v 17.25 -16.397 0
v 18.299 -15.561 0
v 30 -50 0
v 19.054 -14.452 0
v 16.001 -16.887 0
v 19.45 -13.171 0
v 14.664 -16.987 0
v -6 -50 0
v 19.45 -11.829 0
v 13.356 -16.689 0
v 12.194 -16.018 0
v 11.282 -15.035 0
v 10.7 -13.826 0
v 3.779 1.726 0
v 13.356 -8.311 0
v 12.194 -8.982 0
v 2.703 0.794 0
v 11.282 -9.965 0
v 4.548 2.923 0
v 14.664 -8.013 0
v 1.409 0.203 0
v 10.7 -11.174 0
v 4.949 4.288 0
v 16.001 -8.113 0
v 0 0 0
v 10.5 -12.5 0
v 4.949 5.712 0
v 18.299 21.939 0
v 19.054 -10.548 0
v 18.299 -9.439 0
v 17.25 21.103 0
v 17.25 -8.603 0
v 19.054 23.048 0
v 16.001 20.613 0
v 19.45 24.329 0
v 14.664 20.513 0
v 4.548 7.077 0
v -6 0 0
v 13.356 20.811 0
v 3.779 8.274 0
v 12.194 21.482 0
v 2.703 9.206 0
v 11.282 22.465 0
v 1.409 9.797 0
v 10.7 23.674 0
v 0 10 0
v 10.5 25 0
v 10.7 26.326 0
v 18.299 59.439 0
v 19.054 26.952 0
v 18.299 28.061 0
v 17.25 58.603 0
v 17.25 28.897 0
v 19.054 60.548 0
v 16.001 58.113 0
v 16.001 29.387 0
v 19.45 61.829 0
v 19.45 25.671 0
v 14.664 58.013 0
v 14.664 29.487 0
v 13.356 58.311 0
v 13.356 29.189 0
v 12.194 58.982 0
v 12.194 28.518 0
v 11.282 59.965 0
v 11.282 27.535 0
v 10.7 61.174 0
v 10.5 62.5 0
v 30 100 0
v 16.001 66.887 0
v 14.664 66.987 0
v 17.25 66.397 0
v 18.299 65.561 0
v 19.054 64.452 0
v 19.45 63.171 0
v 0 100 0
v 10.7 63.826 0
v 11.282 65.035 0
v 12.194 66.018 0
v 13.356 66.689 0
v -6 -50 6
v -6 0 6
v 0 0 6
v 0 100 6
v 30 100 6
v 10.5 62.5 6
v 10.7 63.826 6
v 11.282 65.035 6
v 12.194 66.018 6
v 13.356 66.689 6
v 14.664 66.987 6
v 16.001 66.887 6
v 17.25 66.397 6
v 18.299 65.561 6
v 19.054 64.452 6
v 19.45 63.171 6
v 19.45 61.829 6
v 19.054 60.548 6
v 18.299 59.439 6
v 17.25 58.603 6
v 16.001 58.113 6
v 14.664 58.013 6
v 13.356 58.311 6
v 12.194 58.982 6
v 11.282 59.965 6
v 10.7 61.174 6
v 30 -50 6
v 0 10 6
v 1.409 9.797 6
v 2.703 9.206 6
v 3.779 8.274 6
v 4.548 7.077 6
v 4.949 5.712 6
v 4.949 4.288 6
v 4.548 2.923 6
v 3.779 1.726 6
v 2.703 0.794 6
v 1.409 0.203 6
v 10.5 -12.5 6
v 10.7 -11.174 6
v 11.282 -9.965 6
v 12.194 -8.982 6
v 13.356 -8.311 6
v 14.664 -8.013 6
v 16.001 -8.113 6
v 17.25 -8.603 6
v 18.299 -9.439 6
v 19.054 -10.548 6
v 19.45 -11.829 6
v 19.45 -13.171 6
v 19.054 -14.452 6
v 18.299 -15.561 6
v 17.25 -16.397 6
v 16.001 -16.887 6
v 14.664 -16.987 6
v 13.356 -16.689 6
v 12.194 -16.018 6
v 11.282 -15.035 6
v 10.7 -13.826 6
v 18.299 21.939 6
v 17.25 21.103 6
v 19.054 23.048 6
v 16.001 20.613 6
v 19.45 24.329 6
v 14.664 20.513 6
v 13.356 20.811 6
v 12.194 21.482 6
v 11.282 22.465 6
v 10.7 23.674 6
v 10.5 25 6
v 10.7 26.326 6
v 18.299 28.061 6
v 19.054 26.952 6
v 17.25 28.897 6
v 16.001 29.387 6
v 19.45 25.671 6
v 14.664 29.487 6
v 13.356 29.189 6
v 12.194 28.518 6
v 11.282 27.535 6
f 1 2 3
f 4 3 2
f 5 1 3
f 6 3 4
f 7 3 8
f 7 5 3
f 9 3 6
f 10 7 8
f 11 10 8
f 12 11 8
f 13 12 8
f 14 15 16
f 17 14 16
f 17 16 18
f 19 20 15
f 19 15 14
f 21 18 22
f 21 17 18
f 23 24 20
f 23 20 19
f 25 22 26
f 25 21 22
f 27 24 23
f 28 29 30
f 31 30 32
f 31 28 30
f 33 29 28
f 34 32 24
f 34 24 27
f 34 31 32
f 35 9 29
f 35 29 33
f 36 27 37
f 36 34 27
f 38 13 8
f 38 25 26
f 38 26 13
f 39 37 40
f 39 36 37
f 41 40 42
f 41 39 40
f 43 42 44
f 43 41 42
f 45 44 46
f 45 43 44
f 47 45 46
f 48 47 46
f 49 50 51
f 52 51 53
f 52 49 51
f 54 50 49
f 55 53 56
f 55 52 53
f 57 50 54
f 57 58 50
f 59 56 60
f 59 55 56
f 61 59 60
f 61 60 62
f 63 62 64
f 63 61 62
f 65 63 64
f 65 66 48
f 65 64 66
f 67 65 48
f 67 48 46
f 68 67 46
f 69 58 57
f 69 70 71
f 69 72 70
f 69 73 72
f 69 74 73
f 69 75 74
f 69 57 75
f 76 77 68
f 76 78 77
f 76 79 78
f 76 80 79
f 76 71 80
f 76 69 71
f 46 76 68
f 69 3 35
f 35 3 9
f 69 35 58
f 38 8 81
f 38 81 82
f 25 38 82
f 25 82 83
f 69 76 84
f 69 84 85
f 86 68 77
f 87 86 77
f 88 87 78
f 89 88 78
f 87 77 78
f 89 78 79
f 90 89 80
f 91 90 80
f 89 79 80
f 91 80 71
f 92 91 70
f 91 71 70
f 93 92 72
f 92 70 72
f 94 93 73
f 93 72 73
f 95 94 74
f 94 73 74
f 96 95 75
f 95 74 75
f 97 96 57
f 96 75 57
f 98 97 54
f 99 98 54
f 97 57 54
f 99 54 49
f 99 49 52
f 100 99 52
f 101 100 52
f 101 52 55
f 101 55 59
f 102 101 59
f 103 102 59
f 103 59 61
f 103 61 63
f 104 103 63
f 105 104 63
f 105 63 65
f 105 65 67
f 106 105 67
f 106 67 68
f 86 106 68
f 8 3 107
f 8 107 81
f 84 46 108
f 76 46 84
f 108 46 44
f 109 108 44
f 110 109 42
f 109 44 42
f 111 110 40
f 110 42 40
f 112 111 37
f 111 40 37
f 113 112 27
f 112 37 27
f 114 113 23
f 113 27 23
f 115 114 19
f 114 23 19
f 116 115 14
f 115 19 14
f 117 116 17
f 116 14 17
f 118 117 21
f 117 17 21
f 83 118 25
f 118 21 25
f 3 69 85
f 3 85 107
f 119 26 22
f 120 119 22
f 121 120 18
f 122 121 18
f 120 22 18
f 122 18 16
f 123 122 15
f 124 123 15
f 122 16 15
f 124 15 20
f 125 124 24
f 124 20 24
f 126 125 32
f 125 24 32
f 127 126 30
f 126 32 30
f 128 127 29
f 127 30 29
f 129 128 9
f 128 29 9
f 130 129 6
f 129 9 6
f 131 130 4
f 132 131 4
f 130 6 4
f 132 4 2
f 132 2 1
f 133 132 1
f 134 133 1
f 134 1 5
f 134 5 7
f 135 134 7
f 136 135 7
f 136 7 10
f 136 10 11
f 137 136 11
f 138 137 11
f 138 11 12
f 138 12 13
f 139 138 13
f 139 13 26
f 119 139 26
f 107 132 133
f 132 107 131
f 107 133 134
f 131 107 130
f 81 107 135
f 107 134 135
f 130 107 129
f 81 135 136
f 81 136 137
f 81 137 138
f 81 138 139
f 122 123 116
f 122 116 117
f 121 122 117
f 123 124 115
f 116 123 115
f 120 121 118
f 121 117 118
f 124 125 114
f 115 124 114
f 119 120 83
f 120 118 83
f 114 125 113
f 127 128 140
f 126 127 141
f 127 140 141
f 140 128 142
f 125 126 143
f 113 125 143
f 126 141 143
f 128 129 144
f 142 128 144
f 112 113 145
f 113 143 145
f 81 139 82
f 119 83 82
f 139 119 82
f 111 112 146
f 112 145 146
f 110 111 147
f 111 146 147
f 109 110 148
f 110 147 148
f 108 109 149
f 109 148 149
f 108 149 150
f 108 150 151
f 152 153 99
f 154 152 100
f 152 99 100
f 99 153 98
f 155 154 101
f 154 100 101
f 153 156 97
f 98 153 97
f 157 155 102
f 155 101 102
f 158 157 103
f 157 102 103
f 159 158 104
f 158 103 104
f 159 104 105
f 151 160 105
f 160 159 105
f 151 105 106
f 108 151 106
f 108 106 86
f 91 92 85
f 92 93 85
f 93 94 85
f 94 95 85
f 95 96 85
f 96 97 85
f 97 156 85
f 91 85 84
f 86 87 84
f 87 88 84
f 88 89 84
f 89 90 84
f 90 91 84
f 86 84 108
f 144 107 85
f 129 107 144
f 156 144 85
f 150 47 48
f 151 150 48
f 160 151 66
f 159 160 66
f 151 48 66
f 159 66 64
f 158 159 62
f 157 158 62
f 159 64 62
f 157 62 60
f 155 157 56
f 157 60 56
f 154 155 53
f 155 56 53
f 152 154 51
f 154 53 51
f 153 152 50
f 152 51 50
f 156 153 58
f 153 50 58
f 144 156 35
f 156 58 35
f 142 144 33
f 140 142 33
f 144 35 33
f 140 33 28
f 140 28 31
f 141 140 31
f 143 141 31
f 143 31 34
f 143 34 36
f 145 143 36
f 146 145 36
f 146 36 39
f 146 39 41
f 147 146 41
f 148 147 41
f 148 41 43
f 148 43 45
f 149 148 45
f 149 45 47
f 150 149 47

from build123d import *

# Parameters (mm, degrees)
BOSS_EXTRUDE1_DEPTH  = 6
M8_CLEARANCE_HOLE1_D = 9
SKETCH5_R            = 5
CUT_EXTRUDE1_DEPTH   = 105.575331699


with BuildPart() as part:
    # Sketch1 → Boss-Extrude1 (new body)
    with BuildSketch(Plane.XY):
        Polygon((0, 100), (30, 100), (30, -50), (-6, -50), (-6, 0), (0, 0), align=None)
    extrude(amount=BOSS_EXTRUDE1_DEPTH)

    # M8 Clearance Hole1 (through all)
    with Locations(Plane.XY.offset(6)):
        with Locations((15, 62.5), (15, 25), (15, -12.5)):
            Hole(M8_CLEARANCE_HOLE1_D / 2)

    # Sketch5 → Cut-Extrude1 (cut, through all)
    with BuildSketch(Plane(origin=(0, 0, 0), x_dir=(-1, 0, 0), z_dir=(0, 0, -1))):
        with Locations((0, 5)):
            Circle(SKETCH5_R)
    extrude(amount=-CUT_EXTRUDE1_DEPTH, mode=Mode.SUBTRACT)


solid = part.part
